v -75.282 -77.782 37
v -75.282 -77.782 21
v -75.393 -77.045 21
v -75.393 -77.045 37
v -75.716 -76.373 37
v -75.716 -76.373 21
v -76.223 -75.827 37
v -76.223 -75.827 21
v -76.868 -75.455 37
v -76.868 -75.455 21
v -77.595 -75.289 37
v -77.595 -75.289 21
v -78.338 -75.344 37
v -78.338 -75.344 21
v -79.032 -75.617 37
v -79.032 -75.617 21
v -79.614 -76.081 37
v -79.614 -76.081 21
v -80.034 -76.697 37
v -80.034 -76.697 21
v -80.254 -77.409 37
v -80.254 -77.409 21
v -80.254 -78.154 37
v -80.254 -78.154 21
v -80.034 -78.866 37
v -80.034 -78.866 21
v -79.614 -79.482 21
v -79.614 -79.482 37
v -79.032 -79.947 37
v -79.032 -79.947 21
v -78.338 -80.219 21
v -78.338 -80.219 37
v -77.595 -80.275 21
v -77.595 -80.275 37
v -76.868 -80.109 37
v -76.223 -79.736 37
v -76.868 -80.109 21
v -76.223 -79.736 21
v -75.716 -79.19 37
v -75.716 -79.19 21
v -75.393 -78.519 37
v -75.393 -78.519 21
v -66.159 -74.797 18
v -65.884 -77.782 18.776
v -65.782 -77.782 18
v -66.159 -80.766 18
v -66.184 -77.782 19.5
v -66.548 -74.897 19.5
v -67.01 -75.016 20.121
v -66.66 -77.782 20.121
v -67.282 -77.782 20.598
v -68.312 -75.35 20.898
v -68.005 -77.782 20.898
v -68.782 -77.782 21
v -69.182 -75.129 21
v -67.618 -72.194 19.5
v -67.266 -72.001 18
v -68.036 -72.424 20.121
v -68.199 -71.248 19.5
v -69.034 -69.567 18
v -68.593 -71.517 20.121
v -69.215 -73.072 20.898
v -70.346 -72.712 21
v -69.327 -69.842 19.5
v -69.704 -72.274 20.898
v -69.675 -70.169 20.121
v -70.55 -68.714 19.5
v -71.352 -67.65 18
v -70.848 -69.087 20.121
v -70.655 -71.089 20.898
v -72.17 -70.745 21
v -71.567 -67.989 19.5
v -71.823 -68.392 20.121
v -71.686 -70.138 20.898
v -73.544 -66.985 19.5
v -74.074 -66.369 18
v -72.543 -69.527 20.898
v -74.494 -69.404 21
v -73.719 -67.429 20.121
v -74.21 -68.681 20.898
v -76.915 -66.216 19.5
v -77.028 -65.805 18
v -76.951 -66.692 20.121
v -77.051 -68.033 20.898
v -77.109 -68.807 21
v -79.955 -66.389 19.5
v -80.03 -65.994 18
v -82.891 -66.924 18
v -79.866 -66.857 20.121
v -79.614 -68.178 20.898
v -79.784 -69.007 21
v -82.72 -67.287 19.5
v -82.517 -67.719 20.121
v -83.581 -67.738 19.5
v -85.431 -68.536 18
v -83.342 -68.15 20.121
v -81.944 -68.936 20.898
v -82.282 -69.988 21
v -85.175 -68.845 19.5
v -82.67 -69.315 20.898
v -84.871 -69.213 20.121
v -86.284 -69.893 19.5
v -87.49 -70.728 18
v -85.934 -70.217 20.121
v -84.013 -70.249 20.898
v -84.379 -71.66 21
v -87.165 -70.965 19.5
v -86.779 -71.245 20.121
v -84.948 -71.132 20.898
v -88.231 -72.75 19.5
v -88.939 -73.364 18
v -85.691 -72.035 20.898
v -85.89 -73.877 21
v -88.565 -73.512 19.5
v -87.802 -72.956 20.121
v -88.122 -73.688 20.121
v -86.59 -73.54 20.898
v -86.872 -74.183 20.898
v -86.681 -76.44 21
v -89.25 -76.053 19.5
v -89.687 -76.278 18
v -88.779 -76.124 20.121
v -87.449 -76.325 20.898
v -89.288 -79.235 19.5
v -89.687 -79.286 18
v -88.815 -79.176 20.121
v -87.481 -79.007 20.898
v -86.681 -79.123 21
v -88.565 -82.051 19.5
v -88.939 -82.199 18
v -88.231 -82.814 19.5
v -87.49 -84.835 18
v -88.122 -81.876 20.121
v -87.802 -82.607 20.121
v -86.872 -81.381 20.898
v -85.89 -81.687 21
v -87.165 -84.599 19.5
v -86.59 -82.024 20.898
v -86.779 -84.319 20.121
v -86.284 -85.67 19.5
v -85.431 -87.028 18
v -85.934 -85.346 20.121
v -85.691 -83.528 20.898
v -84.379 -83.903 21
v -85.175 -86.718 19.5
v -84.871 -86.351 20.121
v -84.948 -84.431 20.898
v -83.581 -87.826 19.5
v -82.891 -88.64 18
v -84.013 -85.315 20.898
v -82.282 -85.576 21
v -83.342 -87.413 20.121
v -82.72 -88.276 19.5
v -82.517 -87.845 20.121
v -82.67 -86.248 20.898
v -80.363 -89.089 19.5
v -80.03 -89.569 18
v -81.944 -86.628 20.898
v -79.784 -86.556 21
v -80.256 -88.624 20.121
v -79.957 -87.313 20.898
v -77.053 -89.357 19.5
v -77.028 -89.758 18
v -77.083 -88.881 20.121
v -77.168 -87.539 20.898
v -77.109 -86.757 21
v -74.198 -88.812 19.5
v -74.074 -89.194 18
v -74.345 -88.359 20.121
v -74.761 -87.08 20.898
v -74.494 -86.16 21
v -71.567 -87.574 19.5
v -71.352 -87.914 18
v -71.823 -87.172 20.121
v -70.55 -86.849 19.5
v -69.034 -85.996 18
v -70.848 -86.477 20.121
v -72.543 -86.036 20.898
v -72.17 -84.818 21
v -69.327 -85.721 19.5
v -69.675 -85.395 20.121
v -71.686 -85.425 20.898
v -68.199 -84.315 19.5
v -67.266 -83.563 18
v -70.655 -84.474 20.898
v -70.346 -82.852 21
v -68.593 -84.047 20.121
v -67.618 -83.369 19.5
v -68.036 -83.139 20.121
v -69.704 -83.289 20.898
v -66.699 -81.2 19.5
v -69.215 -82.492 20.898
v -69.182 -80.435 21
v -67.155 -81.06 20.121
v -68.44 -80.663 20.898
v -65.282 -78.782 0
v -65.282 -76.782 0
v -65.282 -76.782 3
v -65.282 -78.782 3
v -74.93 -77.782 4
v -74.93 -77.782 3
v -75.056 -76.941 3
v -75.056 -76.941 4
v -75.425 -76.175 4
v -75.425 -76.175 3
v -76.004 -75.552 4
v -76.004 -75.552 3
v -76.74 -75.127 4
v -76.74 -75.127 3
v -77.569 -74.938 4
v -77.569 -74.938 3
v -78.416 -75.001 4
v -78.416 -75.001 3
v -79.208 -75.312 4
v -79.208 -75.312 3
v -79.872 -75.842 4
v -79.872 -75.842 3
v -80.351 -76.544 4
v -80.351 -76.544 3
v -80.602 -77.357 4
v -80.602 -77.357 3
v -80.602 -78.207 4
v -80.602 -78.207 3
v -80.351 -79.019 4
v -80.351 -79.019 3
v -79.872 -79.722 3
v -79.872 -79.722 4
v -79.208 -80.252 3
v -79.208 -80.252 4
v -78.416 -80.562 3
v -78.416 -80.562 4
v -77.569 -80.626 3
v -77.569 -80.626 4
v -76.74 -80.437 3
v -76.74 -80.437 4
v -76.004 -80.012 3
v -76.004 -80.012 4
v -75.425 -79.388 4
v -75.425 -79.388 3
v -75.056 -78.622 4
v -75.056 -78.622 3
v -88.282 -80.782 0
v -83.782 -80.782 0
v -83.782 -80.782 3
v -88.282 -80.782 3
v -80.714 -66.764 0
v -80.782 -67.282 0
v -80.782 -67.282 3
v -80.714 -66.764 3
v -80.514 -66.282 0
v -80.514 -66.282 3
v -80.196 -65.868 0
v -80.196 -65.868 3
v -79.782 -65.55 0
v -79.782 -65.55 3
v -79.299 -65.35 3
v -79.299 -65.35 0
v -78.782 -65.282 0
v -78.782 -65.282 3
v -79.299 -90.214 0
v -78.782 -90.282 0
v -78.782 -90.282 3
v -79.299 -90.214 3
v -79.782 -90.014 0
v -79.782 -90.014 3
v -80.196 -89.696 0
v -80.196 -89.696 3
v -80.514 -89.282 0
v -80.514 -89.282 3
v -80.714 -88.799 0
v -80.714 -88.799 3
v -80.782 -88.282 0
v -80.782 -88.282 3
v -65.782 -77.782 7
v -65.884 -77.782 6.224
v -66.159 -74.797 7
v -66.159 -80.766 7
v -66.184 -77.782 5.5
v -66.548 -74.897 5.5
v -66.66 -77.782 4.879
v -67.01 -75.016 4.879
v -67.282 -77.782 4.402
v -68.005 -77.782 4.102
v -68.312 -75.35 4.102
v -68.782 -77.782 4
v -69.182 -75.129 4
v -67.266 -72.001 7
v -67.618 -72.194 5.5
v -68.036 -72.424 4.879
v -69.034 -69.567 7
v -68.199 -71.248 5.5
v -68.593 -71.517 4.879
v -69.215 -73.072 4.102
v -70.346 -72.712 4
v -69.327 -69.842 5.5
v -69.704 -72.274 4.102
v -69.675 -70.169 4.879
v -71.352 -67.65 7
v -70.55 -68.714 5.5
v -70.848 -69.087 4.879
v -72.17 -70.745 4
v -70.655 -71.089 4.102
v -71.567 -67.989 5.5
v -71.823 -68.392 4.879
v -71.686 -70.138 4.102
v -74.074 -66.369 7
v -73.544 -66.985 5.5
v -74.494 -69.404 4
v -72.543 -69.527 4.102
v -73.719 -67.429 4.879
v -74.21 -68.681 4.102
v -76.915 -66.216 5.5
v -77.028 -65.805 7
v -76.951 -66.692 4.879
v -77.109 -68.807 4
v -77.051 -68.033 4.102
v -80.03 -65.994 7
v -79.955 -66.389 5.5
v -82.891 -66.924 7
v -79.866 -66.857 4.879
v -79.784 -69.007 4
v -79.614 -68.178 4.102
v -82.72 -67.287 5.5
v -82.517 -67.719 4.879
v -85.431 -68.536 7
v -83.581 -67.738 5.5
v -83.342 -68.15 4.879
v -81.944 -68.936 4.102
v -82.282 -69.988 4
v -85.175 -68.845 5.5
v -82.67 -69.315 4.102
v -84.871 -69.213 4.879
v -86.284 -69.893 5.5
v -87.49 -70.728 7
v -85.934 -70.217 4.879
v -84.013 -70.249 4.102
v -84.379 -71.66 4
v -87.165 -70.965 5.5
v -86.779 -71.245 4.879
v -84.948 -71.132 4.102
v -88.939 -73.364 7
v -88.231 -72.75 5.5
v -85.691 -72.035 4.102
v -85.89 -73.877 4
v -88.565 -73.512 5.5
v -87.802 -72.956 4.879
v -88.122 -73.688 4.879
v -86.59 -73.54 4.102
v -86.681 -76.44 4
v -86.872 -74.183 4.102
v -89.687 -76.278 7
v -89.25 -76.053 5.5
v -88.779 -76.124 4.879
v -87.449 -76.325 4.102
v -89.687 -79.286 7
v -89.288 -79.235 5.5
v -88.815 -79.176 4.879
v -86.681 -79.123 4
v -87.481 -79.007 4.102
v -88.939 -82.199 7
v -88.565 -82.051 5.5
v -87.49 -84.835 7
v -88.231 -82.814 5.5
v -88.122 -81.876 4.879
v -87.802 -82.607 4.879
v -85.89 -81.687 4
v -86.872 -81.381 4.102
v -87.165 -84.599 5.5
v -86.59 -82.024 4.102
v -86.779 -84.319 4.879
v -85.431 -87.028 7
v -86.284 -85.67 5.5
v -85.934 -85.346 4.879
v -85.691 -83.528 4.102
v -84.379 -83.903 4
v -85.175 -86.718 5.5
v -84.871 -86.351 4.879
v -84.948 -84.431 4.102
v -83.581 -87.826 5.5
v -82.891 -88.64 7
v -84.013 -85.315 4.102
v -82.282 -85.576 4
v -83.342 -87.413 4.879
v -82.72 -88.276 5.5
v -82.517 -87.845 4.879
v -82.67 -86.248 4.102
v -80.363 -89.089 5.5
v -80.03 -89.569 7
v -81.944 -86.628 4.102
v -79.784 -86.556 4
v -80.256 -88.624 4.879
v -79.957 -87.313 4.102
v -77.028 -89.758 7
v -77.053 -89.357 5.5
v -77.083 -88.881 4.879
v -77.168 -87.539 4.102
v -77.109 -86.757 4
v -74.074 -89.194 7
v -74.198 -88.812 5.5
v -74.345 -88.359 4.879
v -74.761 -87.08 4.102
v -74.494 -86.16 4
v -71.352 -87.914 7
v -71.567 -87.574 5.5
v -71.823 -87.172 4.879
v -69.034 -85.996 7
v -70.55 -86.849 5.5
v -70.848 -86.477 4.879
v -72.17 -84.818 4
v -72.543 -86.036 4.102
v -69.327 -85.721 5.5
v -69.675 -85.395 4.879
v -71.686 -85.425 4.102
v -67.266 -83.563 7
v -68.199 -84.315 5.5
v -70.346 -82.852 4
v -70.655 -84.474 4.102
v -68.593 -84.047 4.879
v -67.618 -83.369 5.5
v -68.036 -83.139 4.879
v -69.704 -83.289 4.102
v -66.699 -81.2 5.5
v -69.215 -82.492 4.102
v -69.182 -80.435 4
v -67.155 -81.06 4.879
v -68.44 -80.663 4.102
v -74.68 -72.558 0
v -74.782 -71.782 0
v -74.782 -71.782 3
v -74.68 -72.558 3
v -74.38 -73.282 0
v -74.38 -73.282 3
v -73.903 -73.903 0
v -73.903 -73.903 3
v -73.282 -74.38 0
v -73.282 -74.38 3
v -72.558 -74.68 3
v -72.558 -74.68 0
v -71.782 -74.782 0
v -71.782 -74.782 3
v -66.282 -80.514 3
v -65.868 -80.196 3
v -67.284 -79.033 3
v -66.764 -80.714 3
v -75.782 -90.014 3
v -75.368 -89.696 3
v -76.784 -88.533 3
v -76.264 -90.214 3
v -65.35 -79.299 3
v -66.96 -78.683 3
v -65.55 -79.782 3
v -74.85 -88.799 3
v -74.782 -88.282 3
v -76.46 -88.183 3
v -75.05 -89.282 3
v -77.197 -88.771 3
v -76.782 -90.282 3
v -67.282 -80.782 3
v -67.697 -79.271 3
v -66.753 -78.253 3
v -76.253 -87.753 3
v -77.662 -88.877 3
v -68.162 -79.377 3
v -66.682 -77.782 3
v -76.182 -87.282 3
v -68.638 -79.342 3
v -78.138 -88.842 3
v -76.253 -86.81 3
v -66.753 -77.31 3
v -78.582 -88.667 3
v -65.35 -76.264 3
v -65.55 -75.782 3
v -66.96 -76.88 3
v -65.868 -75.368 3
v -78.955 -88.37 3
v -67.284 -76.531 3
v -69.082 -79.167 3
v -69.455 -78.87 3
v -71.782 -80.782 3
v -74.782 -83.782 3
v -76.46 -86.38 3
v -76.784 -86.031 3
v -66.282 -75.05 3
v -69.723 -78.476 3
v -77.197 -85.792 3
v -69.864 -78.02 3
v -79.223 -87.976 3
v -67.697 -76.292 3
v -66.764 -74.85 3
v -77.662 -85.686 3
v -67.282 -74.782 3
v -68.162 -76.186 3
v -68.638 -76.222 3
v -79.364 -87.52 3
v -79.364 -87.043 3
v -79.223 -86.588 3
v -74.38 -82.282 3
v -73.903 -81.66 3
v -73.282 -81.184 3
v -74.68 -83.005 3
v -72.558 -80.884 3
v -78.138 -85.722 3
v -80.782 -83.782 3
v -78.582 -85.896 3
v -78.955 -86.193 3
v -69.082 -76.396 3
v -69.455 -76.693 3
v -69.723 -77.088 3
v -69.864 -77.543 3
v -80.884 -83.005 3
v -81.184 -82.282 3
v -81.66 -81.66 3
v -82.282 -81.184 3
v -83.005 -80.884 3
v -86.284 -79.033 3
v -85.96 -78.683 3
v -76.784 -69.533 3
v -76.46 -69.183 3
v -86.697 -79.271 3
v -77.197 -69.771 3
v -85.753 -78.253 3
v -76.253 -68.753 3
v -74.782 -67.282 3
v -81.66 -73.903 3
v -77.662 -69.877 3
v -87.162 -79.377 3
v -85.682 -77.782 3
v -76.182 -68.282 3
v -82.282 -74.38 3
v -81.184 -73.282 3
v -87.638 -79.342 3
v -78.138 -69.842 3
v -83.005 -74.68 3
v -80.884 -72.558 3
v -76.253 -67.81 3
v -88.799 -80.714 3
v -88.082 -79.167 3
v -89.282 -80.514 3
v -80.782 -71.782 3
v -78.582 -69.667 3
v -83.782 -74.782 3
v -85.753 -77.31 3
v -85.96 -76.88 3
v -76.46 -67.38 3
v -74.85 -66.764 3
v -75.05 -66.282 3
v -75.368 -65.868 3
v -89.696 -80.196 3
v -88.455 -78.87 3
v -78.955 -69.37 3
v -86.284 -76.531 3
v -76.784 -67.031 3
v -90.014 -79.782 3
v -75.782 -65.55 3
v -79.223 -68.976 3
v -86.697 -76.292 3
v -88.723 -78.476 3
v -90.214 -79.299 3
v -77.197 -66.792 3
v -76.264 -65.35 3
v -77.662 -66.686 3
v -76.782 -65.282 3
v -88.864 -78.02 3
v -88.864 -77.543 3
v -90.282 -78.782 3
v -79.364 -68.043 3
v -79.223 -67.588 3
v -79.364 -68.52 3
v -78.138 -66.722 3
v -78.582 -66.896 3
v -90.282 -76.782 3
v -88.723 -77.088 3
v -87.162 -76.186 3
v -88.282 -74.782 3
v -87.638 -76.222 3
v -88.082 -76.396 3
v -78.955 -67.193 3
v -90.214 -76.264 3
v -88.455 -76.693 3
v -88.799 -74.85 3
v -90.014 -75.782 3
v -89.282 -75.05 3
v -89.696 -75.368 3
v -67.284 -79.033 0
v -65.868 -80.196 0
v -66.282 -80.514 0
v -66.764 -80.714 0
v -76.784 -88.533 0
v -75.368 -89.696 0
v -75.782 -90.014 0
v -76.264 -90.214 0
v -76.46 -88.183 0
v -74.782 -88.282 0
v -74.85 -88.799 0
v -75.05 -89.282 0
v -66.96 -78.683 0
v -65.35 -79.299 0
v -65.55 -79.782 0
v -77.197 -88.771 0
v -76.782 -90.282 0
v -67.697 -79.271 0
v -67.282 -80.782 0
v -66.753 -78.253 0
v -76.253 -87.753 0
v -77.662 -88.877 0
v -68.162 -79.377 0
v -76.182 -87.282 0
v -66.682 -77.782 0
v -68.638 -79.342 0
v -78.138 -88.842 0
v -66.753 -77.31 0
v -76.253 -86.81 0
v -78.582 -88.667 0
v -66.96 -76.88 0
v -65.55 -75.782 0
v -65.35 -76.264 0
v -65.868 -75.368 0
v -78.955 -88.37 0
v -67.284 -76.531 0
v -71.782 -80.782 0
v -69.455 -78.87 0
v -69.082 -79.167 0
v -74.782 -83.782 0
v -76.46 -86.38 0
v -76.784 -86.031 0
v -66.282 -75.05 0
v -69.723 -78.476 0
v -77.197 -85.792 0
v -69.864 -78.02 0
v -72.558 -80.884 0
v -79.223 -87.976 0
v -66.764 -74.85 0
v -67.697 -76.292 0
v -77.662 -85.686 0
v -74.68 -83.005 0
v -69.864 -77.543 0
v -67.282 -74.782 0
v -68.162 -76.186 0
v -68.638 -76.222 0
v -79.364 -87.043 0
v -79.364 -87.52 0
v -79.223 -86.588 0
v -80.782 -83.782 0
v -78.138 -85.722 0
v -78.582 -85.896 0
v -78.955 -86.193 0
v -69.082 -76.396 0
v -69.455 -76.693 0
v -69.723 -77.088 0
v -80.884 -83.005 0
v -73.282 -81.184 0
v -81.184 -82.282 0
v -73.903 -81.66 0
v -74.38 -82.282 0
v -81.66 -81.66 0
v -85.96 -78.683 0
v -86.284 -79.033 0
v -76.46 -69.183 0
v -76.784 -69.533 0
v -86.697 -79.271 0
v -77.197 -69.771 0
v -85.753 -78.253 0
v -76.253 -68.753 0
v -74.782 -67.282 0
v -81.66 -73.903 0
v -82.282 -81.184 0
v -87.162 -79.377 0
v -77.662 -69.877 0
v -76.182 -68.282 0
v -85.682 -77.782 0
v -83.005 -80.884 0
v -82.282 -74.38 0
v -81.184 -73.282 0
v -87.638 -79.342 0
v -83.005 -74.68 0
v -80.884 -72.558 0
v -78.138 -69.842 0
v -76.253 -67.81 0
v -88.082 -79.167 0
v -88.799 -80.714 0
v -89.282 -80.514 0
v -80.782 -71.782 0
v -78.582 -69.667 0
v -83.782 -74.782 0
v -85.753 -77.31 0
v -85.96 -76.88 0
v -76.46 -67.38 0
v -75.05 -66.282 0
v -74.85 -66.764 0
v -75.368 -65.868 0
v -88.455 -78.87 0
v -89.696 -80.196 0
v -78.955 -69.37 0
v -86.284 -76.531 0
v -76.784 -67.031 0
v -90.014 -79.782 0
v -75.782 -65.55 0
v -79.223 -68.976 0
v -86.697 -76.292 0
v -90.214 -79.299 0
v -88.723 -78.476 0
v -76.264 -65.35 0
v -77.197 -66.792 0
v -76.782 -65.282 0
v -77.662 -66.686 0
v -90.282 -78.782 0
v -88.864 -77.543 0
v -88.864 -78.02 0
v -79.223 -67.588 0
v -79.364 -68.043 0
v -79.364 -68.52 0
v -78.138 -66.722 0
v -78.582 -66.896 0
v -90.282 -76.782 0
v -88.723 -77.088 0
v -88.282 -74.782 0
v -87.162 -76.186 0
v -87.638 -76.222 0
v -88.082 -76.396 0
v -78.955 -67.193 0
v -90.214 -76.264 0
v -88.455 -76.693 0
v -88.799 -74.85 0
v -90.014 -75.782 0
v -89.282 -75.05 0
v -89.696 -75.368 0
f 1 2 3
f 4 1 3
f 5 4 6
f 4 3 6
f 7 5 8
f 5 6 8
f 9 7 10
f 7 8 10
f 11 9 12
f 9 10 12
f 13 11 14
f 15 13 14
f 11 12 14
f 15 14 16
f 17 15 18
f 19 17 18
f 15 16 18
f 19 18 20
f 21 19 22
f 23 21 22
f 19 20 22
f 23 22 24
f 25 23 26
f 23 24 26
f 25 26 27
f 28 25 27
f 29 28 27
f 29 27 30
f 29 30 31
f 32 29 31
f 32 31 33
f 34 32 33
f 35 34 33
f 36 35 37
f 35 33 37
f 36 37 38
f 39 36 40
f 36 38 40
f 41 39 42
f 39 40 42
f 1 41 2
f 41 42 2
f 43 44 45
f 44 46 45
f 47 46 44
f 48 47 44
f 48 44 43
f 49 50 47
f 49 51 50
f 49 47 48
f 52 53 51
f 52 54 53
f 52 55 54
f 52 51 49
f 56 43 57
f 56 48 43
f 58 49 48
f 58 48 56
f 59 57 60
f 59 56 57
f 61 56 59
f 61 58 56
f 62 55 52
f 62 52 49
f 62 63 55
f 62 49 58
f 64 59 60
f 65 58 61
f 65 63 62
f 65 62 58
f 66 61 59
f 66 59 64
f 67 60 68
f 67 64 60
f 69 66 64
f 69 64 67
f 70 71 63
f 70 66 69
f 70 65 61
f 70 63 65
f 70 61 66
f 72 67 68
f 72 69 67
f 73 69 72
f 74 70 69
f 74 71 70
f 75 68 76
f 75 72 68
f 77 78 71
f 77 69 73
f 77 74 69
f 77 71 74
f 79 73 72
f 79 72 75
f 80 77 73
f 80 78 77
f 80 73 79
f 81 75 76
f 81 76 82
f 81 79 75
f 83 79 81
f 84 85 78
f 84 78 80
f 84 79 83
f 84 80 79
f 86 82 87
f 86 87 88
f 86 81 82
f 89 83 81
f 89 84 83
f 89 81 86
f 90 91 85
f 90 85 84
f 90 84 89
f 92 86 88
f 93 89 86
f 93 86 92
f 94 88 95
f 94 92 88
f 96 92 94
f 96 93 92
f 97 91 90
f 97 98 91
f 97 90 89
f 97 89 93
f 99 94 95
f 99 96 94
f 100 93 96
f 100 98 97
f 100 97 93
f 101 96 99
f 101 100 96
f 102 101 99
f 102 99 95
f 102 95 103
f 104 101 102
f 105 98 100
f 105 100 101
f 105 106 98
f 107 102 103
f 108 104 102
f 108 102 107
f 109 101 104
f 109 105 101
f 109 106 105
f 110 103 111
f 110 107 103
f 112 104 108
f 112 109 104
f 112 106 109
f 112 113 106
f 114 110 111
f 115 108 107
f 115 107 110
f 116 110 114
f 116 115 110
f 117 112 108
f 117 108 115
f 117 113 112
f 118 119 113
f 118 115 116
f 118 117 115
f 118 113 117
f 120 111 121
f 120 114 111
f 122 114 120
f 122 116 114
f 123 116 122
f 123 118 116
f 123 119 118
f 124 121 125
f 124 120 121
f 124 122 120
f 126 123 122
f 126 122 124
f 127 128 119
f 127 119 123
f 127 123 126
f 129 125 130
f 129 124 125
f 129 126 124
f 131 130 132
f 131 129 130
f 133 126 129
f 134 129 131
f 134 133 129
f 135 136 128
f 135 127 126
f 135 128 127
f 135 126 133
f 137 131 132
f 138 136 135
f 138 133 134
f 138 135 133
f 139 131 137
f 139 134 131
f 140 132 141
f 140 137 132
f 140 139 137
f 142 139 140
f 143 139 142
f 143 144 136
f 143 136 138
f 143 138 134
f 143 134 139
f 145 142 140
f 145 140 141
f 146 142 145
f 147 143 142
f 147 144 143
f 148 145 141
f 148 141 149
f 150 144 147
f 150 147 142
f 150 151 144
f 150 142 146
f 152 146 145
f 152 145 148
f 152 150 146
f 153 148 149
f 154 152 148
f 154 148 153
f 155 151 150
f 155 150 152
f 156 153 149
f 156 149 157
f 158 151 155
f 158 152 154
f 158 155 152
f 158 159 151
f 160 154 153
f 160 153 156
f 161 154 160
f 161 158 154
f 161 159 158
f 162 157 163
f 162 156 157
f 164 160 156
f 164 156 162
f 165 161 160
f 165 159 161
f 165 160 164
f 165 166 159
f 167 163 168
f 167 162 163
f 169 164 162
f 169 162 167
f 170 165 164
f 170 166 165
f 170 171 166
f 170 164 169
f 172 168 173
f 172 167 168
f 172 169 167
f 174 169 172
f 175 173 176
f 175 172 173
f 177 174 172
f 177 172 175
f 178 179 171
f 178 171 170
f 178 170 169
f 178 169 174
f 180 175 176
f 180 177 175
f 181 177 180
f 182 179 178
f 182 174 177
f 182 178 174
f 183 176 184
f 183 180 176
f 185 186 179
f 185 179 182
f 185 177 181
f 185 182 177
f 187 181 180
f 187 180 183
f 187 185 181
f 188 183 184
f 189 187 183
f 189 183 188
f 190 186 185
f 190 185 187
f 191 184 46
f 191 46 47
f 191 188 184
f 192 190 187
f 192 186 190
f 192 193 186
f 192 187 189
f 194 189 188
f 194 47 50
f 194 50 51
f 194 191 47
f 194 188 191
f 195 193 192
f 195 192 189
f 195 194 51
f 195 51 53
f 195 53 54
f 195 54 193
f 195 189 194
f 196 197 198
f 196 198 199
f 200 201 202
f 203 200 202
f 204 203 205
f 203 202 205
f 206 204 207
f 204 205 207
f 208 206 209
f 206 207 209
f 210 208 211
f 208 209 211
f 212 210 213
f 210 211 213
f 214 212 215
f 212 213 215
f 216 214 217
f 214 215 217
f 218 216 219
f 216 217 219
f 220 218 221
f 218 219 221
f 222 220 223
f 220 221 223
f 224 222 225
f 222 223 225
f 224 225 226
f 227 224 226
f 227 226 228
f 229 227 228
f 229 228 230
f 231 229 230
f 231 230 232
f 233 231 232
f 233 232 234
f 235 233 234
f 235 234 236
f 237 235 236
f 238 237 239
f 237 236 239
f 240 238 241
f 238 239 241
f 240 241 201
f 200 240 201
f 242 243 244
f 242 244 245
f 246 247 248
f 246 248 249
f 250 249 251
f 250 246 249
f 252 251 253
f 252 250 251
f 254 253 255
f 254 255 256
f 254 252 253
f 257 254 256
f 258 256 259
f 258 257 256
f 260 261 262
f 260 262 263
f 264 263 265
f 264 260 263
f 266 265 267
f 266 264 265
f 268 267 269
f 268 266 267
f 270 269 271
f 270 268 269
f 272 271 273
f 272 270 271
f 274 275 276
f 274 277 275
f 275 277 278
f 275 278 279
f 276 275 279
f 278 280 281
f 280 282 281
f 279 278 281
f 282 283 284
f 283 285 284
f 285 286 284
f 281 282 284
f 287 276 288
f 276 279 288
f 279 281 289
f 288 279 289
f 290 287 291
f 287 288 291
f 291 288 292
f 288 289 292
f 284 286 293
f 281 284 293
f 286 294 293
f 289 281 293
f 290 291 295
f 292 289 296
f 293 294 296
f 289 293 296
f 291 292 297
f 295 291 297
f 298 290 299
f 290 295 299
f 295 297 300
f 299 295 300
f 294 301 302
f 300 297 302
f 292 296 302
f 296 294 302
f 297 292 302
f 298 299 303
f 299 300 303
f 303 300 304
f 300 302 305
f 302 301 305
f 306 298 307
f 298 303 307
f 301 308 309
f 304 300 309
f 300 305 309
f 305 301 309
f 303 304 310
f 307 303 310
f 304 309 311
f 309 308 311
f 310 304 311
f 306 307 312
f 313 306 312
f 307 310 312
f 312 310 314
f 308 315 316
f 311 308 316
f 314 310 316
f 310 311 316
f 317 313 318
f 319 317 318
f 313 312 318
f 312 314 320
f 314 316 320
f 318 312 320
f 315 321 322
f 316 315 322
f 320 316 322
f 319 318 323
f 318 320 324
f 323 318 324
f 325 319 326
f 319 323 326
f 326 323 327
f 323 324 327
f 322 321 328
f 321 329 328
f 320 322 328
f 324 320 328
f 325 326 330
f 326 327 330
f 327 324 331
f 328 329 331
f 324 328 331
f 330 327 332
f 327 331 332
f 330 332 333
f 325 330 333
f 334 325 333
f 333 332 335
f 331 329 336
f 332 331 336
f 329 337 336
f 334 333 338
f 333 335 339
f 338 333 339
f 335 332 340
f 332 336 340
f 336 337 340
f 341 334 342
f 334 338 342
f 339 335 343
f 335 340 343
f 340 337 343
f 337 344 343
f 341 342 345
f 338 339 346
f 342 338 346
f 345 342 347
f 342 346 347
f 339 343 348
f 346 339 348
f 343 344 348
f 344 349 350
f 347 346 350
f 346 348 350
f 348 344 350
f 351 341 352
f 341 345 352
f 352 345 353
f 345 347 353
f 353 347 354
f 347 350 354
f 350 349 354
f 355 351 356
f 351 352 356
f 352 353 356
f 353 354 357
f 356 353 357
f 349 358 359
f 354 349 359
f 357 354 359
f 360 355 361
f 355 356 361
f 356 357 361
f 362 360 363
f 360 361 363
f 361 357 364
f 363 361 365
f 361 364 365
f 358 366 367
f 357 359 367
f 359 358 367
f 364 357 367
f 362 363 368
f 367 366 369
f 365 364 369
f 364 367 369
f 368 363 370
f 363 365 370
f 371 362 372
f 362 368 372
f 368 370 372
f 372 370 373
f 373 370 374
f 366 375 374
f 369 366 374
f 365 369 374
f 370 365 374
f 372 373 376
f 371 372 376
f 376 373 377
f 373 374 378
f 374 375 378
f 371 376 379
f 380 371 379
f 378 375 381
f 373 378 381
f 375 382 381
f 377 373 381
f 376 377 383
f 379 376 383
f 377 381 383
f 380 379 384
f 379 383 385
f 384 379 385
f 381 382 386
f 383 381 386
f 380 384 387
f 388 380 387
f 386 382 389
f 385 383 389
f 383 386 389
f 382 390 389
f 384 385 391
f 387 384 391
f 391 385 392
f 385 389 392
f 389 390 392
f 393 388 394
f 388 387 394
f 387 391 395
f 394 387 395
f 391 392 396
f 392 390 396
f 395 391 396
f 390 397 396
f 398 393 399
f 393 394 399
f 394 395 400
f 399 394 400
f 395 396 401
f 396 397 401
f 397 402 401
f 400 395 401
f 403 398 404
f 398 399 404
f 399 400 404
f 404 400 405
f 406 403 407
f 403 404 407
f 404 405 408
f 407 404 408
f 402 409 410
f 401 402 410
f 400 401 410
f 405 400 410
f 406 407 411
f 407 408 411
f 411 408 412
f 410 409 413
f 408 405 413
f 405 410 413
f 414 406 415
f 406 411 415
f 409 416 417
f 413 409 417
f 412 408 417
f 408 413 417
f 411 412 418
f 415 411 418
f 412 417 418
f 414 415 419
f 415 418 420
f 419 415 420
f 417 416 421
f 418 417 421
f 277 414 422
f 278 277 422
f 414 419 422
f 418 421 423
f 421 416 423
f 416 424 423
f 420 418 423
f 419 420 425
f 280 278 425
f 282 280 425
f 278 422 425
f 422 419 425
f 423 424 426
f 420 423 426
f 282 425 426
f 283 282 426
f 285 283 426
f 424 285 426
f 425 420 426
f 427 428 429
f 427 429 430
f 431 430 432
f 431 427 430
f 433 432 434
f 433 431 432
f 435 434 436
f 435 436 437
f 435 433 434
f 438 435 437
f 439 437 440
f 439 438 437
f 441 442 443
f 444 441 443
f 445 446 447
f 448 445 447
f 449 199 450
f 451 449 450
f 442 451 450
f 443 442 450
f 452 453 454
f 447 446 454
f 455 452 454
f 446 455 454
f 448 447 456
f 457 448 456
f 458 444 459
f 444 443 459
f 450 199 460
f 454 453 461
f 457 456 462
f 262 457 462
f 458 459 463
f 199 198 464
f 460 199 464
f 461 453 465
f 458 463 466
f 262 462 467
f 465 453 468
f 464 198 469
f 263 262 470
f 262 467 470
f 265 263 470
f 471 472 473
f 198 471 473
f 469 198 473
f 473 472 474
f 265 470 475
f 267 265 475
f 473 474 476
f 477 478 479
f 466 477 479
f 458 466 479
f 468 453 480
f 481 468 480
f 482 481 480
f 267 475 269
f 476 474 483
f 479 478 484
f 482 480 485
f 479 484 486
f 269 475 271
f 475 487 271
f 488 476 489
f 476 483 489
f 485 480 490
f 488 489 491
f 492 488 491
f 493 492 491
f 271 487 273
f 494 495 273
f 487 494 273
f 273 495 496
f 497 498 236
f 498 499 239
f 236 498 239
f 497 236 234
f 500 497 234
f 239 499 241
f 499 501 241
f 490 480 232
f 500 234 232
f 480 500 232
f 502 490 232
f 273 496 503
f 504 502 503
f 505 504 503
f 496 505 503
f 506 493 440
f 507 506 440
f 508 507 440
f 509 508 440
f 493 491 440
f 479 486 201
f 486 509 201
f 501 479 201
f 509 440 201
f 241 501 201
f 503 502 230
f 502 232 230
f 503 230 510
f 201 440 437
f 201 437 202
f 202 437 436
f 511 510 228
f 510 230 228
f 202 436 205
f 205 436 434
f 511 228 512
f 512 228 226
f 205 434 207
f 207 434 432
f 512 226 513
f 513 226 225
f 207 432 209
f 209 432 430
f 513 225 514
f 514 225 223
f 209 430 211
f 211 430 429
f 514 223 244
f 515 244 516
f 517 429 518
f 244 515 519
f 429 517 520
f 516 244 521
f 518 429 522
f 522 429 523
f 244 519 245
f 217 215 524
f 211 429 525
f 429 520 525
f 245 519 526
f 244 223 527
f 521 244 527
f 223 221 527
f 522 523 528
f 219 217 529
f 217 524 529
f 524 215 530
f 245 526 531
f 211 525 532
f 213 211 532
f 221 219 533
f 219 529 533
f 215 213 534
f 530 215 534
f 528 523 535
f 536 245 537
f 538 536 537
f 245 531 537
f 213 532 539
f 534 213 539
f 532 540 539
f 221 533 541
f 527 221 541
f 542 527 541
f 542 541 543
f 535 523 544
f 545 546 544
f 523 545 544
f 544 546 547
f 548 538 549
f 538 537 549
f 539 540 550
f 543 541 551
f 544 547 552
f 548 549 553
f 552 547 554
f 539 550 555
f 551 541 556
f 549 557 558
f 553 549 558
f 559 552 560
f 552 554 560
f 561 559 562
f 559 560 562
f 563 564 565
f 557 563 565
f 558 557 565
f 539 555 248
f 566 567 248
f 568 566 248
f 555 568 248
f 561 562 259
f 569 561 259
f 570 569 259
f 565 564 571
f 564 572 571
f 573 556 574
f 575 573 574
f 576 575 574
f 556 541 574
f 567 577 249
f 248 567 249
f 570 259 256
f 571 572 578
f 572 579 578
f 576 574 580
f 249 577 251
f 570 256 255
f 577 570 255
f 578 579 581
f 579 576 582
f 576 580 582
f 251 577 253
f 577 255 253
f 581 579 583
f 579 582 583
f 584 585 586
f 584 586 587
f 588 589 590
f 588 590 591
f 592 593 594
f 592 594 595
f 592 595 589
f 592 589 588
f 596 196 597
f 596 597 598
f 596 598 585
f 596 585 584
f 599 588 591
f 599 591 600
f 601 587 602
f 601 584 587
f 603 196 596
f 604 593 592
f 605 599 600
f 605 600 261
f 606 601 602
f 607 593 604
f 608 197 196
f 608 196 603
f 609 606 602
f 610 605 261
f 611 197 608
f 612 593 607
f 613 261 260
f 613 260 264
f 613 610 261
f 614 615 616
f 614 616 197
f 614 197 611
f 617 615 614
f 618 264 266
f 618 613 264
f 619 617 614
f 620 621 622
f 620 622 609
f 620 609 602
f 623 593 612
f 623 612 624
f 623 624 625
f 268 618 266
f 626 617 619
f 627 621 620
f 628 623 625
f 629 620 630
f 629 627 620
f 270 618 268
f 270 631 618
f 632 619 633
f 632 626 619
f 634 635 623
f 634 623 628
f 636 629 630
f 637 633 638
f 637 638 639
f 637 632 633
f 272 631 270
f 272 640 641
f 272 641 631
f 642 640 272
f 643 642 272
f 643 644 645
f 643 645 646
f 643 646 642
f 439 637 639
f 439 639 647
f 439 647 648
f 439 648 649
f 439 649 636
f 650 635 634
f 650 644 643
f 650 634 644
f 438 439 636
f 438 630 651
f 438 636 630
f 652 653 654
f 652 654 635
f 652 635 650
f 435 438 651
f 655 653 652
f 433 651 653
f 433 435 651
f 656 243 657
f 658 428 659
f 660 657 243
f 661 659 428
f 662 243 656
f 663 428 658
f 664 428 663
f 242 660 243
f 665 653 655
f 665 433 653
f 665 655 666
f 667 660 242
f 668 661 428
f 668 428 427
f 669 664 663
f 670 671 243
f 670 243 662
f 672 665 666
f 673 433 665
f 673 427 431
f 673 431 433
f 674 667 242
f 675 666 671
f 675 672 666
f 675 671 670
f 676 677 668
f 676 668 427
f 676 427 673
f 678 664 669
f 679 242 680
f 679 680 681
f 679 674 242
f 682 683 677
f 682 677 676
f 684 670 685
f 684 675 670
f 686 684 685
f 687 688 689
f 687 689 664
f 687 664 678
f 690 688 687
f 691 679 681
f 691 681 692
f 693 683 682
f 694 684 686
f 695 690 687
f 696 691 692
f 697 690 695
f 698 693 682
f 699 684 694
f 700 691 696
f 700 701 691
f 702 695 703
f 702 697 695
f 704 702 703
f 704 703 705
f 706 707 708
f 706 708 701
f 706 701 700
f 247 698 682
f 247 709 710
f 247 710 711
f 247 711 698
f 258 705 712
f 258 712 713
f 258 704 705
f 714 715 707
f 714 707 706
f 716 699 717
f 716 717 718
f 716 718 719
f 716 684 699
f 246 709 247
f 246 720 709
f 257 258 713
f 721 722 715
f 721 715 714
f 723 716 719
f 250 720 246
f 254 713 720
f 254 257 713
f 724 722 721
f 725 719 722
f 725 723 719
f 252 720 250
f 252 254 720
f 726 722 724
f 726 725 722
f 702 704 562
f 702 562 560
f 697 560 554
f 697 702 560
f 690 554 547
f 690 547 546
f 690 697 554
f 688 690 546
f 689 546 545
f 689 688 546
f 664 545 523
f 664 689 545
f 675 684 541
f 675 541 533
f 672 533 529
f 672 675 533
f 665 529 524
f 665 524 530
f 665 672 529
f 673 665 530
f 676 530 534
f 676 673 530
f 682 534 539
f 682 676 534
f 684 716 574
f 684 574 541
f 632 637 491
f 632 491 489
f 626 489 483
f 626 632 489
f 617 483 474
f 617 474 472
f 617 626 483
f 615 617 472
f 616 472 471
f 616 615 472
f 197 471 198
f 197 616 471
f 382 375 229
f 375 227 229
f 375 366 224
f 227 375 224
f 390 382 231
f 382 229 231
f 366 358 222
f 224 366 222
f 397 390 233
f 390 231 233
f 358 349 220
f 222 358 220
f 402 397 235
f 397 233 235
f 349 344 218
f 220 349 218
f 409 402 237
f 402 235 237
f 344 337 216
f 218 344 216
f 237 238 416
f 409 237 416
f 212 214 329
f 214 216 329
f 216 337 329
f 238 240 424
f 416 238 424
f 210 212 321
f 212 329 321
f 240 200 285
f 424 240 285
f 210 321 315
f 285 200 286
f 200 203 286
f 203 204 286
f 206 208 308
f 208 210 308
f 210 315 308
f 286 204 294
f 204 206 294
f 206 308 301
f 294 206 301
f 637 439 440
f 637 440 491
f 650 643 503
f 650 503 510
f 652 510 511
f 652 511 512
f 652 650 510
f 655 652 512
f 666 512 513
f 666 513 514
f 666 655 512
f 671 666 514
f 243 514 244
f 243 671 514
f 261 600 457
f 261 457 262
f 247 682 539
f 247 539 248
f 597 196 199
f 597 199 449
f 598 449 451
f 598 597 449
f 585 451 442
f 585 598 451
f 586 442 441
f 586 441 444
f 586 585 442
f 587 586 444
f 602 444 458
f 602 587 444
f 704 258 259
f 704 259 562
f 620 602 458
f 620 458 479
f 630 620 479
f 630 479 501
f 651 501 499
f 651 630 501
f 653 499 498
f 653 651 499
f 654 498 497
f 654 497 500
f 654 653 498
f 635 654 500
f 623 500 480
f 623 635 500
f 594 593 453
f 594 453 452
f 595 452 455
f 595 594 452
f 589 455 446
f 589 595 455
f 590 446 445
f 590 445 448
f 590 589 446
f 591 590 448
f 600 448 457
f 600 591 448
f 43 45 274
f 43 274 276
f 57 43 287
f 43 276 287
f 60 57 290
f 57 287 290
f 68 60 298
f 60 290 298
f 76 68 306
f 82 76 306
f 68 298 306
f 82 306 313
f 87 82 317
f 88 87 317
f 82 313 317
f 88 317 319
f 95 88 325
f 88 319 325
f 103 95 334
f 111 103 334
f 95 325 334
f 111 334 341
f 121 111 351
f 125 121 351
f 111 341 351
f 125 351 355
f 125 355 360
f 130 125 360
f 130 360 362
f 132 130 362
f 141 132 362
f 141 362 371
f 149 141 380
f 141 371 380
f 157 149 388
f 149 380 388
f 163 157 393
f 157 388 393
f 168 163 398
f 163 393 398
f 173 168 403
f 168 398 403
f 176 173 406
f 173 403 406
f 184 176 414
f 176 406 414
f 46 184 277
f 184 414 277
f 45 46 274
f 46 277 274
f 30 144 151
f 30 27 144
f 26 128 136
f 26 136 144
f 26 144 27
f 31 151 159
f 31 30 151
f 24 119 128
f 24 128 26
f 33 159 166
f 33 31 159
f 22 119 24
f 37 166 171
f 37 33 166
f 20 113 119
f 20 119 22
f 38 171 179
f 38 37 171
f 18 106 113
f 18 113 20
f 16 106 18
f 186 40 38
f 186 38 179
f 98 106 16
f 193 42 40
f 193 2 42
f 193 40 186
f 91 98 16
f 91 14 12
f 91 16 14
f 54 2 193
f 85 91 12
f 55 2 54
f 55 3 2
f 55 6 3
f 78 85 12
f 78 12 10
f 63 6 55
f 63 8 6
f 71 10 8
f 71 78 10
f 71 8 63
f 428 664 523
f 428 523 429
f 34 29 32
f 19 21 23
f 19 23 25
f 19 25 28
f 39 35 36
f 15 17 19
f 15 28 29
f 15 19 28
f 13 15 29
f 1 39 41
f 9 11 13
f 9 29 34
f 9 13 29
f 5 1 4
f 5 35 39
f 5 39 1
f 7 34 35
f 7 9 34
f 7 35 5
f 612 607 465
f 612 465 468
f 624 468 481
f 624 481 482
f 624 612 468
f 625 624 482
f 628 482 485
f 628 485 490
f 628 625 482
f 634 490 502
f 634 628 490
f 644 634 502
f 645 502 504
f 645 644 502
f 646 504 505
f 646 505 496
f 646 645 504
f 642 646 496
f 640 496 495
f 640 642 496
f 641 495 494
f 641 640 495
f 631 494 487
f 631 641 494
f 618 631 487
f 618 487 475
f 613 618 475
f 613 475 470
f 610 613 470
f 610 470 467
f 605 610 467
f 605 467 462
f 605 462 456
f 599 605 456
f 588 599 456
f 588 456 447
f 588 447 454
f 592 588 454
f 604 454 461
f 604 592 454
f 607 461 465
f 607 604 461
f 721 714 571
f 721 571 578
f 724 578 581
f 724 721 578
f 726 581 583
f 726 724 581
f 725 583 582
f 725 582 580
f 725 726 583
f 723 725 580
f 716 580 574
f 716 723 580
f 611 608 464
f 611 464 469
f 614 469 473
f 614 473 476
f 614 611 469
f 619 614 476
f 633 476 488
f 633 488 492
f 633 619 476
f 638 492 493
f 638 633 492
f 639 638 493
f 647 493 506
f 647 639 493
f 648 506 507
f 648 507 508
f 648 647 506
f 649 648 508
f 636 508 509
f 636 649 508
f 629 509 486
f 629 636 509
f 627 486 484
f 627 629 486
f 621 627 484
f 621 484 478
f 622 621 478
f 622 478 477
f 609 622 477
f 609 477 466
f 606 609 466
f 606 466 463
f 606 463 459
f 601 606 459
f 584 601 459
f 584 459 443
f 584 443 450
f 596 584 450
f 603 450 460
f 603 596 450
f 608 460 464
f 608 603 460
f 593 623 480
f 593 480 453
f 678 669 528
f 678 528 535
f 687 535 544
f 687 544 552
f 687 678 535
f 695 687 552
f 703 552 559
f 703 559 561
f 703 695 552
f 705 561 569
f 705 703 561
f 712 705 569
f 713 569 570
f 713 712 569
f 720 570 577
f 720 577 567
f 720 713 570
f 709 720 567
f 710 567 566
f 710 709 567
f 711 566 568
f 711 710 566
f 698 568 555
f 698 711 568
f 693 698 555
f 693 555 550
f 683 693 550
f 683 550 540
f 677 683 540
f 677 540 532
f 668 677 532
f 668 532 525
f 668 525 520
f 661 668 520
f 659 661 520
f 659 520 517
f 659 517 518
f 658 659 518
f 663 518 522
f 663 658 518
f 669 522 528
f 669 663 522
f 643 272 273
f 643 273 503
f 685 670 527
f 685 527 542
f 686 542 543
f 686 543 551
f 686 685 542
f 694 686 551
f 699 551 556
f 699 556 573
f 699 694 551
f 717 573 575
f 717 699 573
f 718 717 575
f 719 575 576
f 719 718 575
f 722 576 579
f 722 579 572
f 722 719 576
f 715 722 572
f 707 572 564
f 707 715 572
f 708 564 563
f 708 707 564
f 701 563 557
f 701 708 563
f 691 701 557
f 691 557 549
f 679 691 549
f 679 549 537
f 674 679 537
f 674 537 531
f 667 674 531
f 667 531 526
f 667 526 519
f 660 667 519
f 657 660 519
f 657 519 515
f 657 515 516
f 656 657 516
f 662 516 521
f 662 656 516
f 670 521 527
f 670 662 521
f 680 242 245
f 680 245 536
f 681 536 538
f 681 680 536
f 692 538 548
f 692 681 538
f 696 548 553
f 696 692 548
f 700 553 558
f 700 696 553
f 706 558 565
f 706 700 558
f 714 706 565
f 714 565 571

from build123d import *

# Parameters (mm, degrees)
SKETCH1_R           = 1.6
BOSS_EXTRUDE1_DEPTH = 3
SKETCH2_R           = 2.852011264
BOSS_EXTRUDE2_DEPTH = 1
SKETCH3_R           = 12
BOSS_EXTRUDE3_DEPTH = 17
SKETCH4_R           = 2.5
BOSS_EXTRUDE4_DEPTH = 16
FILLET1_R           = 3


with BuildPart() as part:
    # Sketch1 → Boss-Extrude1 (new body)
    with BuildSketch(Plane.XY):
        with BuildLine():
            Line((-71.781745931, -74.781745931), (-67.281745931, -74.781745931))
            ThreePointArc((-67.281745931, -74.781745931), (-65.867532368, -75.367532368), (-65.281745931, -76.781745931))
            Line((-65.281745931, -76.781745931), (-65.281745931, -78.781745931))
            ThreePointArc((-65.281745931, -78.781745931), (-65.867532368, -80.195959493), (-67.281745931, -80.781745931))
            Line((-67.281745931, -80.781745931), (-71.781745931, -80.781745931))
            ThreePointArc((-71.781745931, -80.781745931), (-73.903066274, -81.660425587), (-74.781745931, -83.781745931))
            Line((-74.781745931, -83.781745931), (-74.781745931, -88.281745931))
            ThreePointArc((-74.781745931, -88.281745931), (-75.367532368, -89.695959493), (-76.781745931, -90.281745931))
            Line((-76.781745931, -90.281745931), (-78.781745931, -90.281745931))
            ThreePointArc((-78.781745931, -90.281745931), (-80.195959493, -89.695959493), (-80.781745931, -88.281745931))
            Line((-80.781745931, -88.281745931), (-80.781745931, -83.781745931))
            ThreePointArc((-80.781745931, -83.781745931), (-81.660425587, -81.660425587), (-83.781745931, -80.781745931))
            Line((-83.781745931, -80.781745931), (-88.281745931, -80.781745931))
            ThreePointArc((-88.281745931, -80.781745931), (-89.695959493, -80.195959493), (-90.281745931, -78.781745931))
            Line((-90.281745931, -78.781745931), (-90.281745931, -76.781745931))
            ThreePointArc((-90.281745931, -76.781745931), (-89.695959493, -75.367532368), (-88.281745931, -74.781745931))
            Line((-88.281745931, -74.781745931), (-83.781745931, -74.781745931))
            ThreePointArc((-83.781745931, -74.781745931), (-81.660425587, -73.903066274), (-80.781745931, -71.781745931))
            Line((-80.781745931, -71.781745931), (-80.781745931, -67.281745931))
            ThreePointArc((-80.781745931, -67.281745931), (-80.195959493, -65.867532368), (-78.781745931, -65.281745931))
            Line((-78.781745931, -65.281745931), (-76.781745931, -65.281745931))
            ThreePointArc((-76.781745931, -65.281745931), (-75.367532368, -65.867532368), (-74.781745931, -67.281745931))
            Line((-74.781745931, -67.281745931), (-74.781745931, -71.781745931))
            ThreePointArc((-74.781745931, -71.781745931), (-73.903066274, -73.903066274), (-71.781745931, -74.781745931))
        make_face()
        with Locations((-77.781745931, -68.281745931)):
            Circle(SKETCH1_R, mode=Mode.SUBTRACT)
        with Locations((-68.281745931, -77.781745931)):
            Circle(SKETCH1_R, mode=Mode.SUBTRACT)
        with Locations((-77.781745931, -87.281745931)):
            Circle(SKETCH1_R, mode=Mode.SUBTRACT)
        with Locations((-87.281745931, -77.781745931)):
            Circle(SKETCH1_R, mode=Mode.SUBTRACT)
    extrude(amount=BOSS_EXTRUDE1_DEPTH)

    # Sketch2 → Boss-Extrude2 (add)
    with BuildSketch(Plane.XY.offset(3)):
        with Locations((-77.781745931, -77.781745931)):
            Circle(SKETCH2_R)
    extrude(amount=BOSS_EXTRUDE2_DEPTH)

    # Sketch3 → Boss-Extrude3 (add)
    with BuildSketch(Plane.XY.offset(4)):
        with Locations((-77.781745931, -77.781745931)):
            Circle(SKETCH3_R)
    extrude(amount=BOSS_EXTRUDE3_DEPTH)

    # Sketch4 → Boss-Extrude4 (add)
    with BuildSketch(Plane.XY.offset(21)):
        with Locations((-77.781745931, -77.781745931)):
            Circle(SKETCH4_R)
    extrude(amount=BOSS_EXTRUDE4_DEPTH)

    # Fillet1
    fillet1_edges = [part.edges().sort_by_distance(p)[0] for p in [
        (-89.781745931, -77.781745931, 4),
        (-89.781745931, -77.781745931, 21),
    ]]
    fillet(fillet1_edges, radius=FILLET1_R)


solid = part.part
